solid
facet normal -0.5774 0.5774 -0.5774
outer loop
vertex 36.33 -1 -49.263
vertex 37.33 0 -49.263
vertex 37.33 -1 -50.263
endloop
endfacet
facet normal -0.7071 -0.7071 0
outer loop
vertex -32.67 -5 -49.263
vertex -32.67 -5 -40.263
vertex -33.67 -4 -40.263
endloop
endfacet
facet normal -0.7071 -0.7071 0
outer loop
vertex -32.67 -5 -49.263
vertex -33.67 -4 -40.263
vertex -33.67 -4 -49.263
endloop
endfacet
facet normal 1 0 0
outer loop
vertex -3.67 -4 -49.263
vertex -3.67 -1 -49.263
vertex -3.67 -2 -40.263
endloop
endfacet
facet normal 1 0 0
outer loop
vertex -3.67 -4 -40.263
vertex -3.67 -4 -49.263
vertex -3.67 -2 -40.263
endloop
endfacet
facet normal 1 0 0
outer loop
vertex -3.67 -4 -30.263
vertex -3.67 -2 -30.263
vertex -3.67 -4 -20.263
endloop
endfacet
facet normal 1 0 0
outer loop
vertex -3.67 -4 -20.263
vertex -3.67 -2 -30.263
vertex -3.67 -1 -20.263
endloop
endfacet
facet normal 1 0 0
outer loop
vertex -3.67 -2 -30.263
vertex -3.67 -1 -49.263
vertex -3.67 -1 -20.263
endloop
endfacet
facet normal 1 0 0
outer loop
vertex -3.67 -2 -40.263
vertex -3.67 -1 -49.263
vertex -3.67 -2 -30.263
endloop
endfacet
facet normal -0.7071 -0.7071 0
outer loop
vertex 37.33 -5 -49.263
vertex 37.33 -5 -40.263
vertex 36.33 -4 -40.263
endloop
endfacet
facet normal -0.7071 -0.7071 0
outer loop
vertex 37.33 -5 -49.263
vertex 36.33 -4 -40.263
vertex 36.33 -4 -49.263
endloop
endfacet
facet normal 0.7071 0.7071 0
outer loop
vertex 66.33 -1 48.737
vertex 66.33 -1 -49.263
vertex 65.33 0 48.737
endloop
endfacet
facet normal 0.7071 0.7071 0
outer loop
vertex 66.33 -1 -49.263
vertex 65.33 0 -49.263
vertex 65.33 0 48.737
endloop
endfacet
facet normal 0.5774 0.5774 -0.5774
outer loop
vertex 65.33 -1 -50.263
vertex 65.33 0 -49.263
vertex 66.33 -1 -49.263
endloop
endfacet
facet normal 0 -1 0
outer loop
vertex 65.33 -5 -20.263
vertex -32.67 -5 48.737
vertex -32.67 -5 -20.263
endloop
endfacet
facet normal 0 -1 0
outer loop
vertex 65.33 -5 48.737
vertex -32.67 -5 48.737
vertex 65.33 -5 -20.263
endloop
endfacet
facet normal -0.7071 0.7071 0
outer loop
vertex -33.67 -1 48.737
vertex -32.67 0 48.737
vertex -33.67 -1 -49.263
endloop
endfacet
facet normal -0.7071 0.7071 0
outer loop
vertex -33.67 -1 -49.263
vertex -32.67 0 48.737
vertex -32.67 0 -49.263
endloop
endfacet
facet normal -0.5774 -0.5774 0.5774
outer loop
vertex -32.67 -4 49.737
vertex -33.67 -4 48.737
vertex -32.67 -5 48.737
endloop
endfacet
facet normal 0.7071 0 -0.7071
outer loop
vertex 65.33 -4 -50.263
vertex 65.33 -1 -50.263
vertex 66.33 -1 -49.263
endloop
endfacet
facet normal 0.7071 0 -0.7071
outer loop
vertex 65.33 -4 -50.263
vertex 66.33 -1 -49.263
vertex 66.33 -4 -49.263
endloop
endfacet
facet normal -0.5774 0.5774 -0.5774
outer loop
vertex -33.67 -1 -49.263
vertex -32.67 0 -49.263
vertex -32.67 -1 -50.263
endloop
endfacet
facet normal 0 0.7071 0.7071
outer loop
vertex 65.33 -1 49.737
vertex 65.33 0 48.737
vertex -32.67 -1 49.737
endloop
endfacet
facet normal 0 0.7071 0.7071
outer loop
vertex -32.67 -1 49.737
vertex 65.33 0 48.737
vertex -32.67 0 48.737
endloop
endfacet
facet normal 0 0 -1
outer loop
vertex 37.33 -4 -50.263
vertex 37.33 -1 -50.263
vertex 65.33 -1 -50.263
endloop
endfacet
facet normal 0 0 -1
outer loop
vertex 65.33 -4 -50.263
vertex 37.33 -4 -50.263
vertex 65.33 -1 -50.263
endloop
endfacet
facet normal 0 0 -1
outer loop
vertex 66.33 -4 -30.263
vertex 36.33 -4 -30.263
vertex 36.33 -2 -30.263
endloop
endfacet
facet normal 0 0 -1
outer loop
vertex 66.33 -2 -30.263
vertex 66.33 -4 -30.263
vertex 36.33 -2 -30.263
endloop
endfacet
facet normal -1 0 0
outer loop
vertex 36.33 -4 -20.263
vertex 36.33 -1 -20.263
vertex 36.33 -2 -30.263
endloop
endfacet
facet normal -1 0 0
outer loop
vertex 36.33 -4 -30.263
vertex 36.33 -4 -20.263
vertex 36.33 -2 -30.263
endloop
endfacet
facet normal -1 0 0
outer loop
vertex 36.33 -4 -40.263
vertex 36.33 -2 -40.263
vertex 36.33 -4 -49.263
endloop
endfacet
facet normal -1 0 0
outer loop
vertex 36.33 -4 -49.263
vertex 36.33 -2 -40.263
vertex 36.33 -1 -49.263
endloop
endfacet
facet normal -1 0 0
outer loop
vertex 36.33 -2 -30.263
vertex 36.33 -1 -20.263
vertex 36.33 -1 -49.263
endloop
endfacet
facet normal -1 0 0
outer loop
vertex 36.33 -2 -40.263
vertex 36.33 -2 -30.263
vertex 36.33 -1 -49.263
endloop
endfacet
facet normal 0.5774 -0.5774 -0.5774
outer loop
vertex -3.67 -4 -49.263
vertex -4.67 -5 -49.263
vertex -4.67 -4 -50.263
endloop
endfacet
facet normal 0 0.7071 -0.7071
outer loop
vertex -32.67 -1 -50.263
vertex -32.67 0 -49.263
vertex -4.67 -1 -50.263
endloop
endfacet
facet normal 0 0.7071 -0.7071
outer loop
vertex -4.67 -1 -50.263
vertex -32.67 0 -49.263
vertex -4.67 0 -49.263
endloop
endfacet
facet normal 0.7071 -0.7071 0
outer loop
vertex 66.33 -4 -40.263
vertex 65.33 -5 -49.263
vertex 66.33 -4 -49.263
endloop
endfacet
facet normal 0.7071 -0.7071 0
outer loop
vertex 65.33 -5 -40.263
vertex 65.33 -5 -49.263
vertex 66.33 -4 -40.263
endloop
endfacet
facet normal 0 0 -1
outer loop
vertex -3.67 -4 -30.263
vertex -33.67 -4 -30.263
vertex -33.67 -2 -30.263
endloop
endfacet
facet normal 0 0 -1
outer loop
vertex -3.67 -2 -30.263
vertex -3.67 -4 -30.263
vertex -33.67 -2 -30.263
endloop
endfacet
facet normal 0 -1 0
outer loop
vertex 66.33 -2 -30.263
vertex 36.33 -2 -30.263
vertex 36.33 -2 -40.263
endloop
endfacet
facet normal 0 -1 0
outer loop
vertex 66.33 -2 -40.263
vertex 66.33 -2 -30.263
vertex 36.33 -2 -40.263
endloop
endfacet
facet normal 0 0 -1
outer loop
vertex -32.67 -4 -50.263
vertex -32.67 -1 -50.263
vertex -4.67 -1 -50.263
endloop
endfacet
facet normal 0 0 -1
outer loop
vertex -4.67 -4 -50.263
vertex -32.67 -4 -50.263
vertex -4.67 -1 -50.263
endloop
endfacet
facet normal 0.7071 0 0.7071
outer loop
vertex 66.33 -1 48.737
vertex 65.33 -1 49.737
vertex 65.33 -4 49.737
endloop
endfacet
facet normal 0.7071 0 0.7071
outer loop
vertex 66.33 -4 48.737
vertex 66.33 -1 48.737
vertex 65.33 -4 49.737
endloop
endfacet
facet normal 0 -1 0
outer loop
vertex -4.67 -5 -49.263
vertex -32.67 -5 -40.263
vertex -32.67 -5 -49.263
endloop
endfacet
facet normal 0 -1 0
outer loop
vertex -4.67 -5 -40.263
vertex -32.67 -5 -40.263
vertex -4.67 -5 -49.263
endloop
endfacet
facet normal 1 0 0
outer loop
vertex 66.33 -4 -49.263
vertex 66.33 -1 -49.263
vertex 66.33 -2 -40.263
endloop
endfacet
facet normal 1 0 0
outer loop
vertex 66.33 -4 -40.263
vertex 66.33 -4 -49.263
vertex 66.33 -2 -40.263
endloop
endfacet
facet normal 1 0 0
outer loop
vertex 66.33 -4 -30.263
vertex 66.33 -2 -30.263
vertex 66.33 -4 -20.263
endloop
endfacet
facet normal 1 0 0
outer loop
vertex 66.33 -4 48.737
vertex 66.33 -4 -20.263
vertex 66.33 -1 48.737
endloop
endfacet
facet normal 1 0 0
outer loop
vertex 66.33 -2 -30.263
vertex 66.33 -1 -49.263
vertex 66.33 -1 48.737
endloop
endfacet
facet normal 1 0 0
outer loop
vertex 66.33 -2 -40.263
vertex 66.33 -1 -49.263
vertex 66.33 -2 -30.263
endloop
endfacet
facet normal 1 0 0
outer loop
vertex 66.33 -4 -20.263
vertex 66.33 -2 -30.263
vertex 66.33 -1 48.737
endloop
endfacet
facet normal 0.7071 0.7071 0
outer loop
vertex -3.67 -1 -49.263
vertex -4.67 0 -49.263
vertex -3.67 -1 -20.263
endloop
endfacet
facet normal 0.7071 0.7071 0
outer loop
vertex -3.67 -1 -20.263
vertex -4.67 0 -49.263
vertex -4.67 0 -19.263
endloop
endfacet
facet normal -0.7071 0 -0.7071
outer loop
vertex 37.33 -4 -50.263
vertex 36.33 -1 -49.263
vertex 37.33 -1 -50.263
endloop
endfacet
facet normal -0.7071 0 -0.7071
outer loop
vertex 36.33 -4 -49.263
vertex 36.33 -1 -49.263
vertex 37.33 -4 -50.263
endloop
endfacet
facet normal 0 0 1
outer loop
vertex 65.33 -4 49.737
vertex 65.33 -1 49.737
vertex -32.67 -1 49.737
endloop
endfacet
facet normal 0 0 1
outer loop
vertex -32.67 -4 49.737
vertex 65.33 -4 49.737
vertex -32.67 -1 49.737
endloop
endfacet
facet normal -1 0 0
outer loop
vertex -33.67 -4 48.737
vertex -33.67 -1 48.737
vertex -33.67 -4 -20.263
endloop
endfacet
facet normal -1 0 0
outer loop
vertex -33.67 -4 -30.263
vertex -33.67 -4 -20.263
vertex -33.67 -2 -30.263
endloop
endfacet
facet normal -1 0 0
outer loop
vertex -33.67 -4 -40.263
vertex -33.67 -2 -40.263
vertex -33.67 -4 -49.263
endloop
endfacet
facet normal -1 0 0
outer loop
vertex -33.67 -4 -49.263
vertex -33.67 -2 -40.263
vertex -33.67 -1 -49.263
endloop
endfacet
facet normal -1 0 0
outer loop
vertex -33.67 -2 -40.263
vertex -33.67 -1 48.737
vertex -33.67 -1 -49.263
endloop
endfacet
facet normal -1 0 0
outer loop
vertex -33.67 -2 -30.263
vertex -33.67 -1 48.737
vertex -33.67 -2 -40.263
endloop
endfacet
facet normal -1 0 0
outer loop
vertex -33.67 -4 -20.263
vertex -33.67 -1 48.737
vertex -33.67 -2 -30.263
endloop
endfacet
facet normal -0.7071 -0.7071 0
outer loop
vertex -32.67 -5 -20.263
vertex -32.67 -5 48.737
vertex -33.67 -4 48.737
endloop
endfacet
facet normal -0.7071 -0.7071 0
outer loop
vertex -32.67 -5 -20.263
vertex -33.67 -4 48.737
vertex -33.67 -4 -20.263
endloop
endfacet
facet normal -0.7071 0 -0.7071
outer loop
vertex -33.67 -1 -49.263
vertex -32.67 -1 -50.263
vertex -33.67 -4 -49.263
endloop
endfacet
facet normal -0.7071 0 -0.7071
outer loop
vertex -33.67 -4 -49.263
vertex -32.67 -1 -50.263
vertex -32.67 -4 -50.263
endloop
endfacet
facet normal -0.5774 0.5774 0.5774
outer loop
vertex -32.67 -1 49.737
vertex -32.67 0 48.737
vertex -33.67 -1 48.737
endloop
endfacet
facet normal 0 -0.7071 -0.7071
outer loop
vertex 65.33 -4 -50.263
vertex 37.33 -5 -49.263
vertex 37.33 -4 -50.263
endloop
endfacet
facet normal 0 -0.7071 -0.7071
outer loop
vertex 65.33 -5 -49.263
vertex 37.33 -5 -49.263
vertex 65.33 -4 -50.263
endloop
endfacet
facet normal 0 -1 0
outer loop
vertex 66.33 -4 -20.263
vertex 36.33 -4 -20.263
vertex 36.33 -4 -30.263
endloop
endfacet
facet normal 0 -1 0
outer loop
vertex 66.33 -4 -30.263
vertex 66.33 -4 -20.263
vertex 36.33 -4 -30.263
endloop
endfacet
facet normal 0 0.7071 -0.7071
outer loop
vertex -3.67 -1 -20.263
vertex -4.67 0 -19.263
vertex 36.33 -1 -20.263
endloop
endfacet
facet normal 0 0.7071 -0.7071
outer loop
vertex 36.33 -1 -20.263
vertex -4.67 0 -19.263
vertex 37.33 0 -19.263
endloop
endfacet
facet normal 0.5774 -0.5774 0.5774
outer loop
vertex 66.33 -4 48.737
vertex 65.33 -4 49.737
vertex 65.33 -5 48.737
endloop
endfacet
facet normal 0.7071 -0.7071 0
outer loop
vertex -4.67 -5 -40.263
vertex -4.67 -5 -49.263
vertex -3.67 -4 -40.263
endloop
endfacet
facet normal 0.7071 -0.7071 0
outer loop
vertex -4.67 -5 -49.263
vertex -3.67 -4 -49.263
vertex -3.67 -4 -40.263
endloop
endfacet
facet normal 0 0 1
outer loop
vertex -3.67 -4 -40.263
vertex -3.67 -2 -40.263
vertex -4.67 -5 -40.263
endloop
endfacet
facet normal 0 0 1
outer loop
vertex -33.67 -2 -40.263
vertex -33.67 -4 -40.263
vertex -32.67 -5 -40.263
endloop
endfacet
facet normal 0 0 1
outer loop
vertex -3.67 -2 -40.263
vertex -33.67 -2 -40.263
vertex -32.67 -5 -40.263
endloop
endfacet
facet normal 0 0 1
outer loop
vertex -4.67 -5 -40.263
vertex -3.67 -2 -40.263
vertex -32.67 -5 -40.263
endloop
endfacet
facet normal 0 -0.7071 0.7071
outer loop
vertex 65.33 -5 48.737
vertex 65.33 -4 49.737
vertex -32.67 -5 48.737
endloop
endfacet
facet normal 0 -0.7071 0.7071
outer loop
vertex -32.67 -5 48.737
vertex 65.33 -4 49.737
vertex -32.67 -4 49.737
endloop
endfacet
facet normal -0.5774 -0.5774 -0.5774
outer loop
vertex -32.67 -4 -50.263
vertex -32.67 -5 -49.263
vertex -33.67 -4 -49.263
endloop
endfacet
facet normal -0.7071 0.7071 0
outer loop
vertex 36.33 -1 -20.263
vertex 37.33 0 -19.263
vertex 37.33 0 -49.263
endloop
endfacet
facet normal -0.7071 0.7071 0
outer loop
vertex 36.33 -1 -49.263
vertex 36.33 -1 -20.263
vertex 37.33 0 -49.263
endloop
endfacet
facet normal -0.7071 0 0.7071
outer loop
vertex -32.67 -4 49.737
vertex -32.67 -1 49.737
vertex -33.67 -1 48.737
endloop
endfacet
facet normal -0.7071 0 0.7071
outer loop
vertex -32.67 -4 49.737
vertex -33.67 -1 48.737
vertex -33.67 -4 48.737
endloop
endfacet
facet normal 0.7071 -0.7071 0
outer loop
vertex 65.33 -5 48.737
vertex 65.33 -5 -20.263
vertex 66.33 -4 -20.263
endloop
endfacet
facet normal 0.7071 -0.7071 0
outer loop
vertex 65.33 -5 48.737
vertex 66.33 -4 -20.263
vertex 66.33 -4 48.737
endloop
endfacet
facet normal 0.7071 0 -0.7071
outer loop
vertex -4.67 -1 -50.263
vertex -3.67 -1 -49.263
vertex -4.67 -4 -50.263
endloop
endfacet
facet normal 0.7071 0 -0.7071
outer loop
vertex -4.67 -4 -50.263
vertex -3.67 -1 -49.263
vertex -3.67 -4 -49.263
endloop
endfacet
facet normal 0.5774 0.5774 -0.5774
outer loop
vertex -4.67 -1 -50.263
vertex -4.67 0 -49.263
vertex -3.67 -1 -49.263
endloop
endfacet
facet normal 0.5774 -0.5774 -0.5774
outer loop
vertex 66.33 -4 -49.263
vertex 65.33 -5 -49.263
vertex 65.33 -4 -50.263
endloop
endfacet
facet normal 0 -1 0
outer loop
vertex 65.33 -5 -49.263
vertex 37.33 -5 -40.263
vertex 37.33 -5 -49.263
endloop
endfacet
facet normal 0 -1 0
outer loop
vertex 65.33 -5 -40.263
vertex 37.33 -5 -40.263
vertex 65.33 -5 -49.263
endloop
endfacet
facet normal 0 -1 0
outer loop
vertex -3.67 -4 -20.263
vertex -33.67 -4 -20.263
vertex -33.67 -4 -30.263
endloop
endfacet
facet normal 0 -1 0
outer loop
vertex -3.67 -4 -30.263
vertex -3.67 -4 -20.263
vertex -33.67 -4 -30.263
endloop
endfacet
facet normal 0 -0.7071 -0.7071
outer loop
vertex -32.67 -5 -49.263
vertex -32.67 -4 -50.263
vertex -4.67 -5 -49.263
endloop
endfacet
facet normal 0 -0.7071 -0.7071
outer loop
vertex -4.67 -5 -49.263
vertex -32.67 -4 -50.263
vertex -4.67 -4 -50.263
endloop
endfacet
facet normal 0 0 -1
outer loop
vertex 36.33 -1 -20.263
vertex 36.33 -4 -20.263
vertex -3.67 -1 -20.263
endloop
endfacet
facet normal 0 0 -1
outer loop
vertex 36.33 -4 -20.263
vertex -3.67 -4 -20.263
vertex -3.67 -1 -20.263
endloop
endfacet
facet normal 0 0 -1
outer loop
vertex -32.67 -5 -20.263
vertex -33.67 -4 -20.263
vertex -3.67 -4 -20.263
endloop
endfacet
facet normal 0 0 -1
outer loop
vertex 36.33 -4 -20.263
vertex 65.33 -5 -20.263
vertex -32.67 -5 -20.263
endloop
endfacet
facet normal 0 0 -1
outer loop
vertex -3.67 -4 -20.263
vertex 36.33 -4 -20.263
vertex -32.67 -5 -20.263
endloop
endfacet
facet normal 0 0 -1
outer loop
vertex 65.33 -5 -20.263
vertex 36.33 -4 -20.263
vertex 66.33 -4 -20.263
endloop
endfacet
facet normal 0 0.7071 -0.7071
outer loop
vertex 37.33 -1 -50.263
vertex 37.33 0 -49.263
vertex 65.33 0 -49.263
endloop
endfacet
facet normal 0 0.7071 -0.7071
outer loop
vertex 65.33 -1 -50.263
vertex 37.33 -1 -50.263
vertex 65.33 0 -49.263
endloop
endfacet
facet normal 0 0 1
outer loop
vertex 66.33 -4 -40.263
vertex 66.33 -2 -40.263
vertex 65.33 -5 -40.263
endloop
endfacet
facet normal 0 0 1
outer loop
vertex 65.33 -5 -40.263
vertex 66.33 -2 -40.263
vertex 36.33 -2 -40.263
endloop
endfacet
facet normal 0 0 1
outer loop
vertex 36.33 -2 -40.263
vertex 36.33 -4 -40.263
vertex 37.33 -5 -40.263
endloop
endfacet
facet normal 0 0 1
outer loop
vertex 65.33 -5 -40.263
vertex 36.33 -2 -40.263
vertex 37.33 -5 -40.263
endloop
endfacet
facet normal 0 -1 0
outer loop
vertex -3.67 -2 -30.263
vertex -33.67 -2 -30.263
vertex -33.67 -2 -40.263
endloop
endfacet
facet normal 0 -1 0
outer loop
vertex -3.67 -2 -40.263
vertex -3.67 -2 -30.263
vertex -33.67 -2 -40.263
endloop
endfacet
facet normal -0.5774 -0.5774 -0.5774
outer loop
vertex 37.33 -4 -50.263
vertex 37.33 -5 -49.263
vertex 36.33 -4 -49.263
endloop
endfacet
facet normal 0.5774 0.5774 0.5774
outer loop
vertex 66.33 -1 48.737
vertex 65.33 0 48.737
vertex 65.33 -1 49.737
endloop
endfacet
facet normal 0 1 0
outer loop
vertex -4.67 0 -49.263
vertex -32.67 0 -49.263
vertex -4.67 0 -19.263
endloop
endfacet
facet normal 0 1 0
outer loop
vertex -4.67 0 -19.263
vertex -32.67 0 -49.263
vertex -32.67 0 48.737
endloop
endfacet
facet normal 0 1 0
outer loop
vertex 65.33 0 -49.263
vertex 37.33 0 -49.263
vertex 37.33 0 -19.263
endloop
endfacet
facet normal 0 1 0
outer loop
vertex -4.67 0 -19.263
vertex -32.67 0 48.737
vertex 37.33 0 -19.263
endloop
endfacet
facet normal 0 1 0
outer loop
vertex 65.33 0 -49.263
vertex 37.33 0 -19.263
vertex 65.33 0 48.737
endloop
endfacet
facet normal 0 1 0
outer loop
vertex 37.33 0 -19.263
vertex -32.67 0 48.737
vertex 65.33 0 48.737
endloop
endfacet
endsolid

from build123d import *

# Parameters (mm, degrees)
F1_DEPTH = 5
F3_DEPTH = 100
F4_SIZE  = 1


with BuildPart() as f1:
    # F0 (on Front) → F1 (new body)
    with BuildSketch(Plane.XZ):
        Polygon((66.3298651576, -50.2631962299), (66.3298651576, 49.7368037701), (-33.6701348424, 49.7368037701), (-33.6701348424, -50.2631962299), (-3.6701348424, -50.2631962299), (-3.6701348424, -20.2631962299), (16.3298651576, -20.2631962299), (36.3298651576, -20.2631962299), (36.3298651576, -50.2631962299), align=None)
    extrude(amount=F1_DEPTH)

    # F2 (on face) → F3 (cut)
    with BuildSketch(Plane(origin=(-33.6701348424, 0, 0), x_dir=(0, -1, 0), z_dir=(-1, 0, 0))):
        Polygon((2, -40.2631962299), (5, -40.2631962299), (5, -20.2631962299), (4, -20.2631962299), (4, -30.2631962299), (2, -30.2631962299), align=None)
    extrude(amount=-F3_DEPTH, mode=Mode.SUBTRACT)

    # F4
    f4_edges = [f1.edges().sort_by_distance(p)[0] for p in [
        (66.329865, 0, -0.263196),
        (16.329865, 0, 49.736804),
        (-33.670135, 0, -0.263196),
        (-18.670135, 0, -50.263196),
        (-3.670135, 0, -35.263196),
        (16.329865, 0, -20.263196),
        (36.329865, 0, -35.263196),
        (51.329865, 0, -50.263196),
        (66.329865, -5, -45.263196),
        (51.329865, -5, -50.263196),
        (36.329865, -5, -45.263196),
        (-3.670135, -5, -45.263196),
        (-18.670135, -5, -50.263196),
        (-33.670135, -5, -45.263196),
        (66.329865, -2.5, -50.263196),
        (36.329865, -2.5, -50.263196),
        (-3.670135, -2.5, -50.263196),
        (-33.670135, -2.5, -50.263196),
        (-33.670135, -2.5, 49.736804),
        (66.329865, -2.5, 49.736804),
        (-33.670135, -5, 14.736804),
        (16.329865, -5, 49.736804),
        (66.329865, -5, 14.736804),
    ]]
    chamfer(f4_edges, length=F4_SIZE)


solid = f1.part
